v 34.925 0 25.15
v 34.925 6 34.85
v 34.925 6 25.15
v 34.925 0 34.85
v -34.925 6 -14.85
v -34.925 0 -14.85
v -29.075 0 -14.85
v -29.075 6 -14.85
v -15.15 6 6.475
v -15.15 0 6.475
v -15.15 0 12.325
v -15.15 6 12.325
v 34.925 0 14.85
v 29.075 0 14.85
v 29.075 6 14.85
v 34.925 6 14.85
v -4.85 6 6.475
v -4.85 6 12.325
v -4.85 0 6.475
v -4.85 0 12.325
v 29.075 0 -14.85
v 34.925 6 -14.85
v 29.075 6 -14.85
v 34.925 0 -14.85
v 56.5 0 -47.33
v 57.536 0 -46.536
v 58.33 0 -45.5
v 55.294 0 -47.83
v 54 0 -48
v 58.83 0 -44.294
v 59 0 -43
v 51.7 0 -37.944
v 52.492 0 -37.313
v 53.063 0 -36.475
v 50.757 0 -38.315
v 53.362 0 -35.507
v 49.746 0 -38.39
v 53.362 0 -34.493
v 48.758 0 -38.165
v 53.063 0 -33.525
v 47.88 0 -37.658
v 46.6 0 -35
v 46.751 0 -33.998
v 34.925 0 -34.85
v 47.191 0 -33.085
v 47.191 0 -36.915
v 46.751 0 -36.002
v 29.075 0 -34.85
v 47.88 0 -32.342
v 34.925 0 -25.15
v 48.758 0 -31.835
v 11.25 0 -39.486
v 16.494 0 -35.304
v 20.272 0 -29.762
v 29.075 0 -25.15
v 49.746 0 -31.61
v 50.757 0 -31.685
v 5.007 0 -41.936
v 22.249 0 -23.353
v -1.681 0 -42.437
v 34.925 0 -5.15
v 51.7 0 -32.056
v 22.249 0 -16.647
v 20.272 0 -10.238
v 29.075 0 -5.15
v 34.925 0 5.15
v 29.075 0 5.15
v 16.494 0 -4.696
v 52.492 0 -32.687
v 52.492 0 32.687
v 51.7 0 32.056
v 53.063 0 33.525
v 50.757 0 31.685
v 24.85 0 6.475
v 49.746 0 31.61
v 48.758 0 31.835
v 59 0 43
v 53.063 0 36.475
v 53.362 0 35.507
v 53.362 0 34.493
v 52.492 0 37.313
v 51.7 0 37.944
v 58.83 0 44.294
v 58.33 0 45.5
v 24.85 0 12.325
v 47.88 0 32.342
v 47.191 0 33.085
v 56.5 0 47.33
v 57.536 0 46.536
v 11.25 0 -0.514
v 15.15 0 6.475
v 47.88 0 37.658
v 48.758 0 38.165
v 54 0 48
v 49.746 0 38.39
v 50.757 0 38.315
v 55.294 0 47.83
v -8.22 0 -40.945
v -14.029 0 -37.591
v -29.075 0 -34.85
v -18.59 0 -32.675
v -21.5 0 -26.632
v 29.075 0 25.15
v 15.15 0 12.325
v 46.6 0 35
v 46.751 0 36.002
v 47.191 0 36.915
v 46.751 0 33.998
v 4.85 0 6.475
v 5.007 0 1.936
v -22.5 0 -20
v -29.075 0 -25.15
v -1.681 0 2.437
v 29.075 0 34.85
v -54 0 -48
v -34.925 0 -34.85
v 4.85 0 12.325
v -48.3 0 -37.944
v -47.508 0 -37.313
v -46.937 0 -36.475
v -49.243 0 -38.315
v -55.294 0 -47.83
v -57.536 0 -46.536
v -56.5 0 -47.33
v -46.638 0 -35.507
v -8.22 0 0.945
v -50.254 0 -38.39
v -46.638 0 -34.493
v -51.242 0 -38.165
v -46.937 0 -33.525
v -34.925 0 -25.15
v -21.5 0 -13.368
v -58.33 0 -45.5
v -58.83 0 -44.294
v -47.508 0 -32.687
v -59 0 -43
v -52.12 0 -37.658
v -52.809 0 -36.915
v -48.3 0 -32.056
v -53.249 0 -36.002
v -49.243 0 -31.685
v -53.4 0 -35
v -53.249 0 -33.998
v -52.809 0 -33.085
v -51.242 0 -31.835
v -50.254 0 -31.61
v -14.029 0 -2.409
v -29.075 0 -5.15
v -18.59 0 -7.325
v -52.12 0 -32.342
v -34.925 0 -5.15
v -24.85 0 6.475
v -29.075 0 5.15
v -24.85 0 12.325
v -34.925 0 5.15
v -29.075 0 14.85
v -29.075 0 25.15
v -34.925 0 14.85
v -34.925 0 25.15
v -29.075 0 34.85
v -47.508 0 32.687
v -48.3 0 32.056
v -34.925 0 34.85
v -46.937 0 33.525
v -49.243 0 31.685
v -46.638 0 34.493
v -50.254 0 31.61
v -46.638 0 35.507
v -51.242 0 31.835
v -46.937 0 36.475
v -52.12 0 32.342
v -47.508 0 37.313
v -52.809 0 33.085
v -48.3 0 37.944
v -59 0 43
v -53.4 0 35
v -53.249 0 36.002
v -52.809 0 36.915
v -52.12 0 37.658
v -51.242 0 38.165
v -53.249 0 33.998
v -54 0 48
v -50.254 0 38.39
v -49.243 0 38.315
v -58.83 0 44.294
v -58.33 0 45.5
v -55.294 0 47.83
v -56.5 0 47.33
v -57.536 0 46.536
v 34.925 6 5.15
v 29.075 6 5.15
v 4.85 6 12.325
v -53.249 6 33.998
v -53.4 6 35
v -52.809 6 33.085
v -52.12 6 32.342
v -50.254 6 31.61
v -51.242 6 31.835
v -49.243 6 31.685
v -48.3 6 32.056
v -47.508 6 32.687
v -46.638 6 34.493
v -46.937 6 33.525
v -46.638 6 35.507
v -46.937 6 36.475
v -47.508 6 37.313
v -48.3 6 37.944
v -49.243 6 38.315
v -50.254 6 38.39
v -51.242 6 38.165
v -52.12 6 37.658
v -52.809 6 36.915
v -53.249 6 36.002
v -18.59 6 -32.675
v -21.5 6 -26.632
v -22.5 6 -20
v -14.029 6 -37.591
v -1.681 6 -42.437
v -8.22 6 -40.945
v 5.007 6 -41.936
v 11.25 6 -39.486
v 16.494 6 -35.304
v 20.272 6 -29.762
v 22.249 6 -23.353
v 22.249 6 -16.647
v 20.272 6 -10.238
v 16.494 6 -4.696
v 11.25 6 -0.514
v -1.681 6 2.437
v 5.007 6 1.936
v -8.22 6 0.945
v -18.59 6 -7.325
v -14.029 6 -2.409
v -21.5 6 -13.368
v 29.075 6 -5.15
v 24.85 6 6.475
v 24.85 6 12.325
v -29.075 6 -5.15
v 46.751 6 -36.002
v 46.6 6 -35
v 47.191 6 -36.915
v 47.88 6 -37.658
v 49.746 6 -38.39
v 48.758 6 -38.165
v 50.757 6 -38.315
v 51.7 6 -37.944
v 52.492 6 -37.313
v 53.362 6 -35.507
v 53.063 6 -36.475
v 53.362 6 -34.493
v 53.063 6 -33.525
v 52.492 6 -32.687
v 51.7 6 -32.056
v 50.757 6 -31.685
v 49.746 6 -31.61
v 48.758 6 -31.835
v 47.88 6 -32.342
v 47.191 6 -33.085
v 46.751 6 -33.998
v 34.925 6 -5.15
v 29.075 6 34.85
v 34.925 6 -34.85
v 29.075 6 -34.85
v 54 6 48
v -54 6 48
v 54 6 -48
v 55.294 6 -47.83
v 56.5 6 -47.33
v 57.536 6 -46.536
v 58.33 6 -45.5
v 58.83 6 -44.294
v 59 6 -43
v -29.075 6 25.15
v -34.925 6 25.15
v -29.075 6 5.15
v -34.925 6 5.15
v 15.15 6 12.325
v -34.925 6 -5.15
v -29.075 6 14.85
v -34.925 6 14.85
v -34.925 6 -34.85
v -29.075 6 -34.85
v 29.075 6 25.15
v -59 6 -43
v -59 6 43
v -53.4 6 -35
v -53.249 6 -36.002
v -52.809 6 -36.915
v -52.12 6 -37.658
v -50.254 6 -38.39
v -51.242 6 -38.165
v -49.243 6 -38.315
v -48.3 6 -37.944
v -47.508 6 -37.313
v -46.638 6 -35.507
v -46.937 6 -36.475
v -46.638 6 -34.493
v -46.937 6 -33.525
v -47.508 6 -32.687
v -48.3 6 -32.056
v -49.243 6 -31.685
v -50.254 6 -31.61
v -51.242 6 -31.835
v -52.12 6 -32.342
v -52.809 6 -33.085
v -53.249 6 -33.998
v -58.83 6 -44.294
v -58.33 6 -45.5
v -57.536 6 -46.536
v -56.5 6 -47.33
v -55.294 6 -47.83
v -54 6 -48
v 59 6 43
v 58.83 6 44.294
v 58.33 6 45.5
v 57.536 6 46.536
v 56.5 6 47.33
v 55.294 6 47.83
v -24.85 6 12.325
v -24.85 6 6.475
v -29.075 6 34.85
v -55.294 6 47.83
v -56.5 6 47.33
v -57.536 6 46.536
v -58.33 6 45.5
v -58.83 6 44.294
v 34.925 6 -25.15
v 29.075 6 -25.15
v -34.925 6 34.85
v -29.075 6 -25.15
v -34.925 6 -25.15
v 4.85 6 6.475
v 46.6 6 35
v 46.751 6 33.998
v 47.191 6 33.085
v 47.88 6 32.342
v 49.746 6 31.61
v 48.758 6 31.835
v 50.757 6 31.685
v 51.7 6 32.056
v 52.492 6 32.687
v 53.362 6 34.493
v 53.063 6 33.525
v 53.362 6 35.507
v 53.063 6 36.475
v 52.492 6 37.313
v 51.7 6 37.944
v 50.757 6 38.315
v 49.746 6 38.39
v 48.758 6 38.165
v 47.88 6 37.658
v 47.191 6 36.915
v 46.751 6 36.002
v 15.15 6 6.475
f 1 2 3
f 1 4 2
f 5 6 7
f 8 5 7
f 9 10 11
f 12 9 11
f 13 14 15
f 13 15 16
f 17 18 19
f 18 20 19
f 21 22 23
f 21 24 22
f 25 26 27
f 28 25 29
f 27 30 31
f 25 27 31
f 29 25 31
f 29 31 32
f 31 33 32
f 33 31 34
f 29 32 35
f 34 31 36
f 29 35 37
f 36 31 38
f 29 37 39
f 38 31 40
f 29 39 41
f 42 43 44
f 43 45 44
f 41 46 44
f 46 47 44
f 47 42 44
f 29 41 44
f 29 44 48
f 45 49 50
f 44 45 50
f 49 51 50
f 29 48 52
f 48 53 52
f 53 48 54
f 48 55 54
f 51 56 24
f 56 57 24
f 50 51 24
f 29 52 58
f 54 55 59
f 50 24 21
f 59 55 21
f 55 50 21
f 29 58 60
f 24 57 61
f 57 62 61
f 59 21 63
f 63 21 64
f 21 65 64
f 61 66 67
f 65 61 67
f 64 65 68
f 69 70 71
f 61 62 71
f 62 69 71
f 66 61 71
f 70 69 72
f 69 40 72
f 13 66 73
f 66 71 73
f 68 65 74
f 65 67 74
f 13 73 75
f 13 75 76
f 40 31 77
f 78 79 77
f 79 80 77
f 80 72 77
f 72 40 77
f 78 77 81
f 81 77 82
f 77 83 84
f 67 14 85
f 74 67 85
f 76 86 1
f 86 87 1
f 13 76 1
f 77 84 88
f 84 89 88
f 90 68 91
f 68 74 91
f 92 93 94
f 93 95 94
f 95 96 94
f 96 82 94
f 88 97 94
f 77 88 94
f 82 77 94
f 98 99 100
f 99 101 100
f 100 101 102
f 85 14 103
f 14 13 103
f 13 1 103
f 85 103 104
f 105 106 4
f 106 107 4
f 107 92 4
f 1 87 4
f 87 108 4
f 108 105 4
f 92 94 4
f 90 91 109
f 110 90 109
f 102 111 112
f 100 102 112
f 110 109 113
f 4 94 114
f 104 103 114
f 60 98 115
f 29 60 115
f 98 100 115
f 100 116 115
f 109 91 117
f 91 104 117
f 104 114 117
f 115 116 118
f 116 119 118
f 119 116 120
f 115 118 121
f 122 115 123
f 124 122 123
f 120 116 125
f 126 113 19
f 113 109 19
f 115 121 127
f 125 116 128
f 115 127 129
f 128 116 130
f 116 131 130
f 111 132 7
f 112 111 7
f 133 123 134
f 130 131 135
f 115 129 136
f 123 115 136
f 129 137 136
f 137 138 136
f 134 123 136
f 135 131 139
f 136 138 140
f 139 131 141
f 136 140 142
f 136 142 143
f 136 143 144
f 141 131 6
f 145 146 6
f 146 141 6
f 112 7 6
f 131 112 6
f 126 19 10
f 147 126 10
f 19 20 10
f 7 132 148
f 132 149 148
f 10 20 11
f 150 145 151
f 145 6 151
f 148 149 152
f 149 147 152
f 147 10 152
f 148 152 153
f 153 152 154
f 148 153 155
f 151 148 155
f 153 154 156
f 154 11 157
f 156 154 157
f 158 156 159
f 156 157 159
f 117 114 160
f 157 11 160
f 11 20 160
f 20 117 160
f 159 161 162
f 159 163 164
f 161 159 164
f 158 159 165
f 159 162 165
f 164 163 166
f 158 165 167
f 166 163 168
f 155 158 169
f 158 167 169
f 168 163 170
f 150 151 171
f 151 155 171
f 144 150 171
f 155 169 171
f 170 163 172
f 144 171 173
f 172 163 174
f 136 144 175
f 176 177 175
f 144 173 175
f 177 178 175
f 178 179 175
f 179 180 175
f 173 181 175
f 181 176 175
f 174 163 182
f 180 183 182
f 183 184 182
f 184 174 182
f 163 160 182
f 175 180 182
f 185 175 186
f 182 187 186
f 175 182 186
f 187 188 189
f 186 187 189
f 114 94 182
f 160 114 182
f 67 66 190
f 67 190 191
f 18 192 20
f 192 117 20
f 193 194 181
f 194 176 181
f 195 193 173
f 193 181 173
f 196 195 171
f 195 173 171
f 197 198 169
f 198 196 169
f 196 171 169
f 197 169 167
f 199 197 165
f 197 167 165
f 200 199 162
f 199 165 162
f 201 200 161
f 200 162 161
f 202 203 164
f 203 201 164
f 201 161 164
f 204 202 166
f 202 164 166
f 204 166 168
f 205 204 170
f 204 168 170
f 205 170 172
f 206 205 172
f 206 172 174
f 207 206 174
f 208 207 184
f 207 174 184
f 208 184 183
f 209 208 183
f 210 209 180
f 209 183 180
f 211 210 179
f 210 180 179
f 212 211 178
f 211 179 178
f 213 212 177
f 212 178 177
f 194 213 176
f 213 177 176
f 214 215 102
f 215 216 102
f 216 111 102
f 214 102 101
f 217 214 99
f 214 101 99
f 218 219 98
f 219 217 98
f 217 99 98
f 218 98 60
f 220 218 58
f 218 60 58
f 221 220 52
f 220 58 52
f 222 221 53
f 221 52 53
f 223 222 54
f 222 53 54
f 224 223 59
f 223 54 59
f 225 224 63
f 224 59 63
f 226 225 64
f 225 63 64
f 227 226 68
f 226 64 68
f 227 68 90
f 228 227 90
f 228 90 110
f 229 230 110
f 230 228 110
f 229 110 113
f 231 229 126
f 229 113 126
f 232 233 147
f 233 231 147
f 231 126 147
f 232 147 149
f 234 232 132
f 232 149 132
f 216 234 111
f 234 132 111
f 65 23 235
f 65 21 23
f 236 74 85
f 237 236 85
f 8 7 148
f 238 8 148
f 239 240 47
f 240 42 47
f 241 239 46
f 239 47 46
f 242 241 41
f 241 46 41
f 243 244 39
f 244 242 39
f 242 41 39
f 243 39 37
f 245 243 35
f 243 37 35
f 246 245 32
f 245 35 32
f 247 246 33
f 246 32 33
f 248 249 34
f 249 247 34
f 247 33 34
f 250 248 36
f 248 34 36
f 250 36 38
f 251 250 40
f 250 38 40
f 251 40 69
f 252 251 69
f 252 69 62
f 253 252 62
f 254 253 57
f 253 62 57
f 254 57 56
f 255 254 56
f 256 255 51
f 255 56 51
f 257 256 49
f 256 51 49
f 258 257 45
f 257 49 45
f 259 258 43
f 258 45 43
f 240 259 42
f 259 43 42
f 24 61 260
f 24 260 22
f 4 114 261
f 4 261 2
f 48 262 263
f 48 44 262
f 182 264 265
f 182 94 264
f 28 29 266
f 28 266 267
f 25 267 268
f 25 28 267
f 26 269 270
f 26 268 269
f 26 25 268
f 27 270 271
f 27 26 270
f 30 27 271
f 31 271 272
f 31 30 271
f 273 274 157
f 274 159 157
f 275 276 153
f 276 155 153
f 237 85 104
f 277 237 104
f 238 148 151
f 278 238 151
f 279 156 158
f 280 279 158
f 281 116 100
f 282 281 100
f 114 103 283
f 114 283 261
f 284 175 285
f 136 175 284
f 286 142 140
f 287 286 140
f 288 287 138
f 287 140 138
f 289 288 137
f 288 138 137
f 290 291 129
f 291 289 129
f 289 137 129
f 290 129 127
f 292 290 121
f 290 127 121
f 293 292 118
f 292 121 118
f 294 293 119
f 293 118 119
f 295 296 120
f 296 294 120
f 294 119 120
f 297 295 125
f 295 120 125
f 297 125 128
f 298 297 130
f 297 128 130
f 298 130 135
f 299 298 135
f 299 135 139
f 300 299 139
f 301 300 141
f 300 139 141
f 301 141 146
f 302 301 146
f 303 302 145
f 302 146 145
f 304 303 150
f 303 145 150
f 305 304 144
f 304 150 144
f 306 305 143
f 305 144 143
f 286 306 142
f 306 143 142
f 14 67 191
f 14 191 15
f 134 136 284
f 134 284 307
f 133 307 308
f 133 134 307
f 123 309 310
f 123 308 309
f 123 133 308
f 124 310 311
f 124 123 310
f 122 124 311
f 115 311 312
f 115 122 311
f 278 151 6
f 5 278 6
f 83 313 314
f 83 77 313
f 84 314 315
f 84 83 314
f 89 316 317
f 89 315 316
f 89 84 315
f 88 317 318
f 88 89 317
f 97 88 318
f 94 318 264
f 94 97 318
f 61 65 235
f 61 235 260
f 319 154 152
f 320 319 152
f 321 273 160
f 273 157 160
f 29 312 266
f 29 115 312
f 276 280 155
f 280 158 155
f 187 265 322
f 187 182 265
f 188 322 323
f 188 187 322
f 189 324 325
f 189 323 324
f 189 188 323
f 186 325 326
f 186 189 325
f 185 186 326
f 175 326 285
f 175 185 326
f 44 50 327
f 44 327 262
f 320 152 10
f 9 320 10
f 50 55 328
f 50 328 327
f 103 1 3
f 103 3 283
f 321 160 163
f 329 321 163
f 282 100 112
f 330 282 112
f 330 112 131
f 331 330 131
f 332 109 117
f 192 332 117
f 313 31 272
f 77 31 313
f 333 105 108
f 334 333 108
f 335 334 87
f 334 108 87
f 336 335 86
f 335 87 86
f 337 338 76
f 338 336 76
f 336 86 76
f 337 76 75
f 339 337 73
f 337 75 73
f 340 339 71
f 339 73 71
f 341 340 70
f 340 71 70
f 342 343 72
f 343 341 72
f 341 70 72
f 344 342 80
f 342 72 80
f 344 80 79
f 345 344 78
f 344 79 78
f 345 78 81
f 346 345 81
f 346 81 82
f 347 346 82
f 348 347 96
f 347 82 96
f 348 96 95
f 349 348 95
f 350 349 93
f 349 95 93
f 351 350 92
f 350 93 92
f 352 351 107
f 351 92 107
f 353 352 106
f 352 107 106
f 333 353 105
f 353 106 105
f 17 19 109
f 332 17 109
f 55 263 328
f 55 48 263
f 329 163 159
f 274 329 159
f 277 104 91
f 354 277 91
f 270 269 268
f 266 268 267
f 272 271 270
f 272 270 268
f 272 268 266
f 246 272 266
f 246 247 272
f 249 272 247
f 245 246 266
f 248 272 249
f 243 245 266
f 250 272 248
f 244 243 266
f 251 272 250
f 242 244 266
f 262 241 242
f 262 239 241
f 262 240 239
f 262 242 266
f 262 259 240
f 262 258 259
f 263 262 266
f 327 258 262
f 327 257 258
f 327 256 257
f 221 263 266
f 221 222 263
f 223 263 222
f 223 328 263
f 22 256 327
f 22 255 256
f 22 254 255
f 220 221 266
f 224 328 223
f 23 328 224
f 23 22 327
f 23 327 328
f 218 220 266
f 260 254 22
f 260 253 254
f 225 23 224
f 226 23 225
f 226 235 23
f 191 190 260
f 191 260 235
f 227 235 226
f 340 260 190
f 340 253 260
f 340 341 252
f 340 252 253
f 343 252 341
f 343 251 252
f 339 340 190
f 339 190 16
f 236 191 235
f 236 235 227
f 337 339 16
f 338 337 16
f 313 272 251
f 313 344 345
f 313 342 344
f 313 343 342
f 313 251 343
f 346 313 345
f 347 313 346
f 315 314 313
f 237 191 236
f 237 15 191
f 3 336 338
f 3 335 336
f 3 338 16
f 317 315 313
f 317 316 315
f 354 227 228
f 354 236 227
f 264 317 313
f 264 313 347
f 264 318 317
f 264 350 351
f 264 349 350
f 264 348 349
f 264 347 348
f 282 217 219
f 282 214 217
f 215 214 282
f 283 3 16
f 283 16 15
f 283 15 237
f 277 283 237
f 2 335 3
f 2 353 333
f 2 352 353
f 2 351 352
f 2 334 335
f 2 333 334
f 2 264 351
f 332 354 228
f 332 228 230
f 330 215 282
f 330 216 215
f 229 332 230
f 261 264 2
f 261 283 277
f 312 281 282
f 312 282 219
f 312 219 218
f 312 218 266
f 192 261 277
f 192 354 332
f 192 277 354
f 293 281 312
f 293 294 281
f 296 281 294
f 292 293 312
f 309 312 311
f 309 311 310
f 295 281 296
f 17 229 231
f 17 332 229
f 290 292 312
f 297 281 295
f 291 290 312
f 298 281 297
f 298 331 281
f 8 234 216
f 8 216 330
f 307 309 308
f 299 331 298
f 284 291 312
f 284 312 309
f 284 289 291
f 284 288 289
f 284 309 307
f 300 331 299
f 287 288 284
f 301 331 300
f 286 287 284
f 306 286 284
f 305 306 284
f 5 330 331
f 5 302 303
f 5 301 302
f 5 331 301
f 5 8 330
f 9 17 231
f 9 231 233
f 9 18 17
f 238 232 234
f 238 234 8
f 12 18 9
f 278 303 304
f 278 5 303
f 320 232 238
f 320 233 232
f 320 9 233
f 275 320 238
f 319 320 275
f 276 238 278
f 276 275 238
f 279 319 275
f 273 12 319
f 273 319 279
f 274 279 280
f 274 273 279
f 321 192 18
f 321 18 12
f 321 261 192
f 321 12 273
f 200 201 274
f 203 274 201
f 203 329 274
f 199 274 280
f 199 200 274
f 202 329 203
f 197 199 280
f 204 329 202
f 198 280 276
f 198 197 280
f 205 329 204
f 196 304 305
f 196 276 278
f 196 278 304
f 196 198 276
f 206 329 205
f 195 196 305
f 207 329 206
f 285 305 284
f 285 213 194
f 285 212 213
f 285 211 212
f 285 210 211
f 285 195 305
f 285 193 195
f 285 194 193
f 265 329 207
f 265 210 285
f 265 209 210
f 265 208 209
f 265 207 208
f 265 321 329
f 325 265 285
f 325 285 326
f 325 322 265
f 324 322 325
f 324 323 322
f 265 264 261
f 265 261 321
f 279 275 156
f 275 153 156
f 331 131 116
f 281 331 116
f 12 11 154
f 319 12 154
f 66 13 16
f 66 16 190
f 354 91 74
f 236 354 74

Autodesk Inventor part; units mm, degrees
ref_plane "YZ Plane" through (0, 0, 0) normal (1, 0, 0) x (0, 1, 0)
ref_plane "XZ Plane" through (0, 0, 0) normal (0, 1, 0) x (-1, 0, 0)
ref_plane "XY Plane" through (0, 0, 0) normal (0, 0, 1) x (1, 0, 0)
sketch "Sketch1" plane through (0, 0, 0) normal (0, 1, 0) x (-1, 0, 0)
  line L0 (54, -48) -> (-54, -48)
  line L1 (-59, -43) -> (-59, 43)
  line L2 (-54, 48) -> (54, 48)
  line L3 (59, 43) -> (59, -43)
  line L4 (50, -35) -> (-50, -35) construction
  line L5 (-50, -35) -> (-50, 35) construction
  line L6 (-50, 35) -> (50, 35) construction
  line L7 (50, 35) -> (50, -35) construction
  arc A0 (59, 43) -> (54, 48) centre (54, 43) ccw
  arc A1 (-54, 48) -> (-59, 43) centre (-54, 43) ccw
  arc A2 (-59, -43) -> (-54, -48) centre (-54, -43) ccw
  arc A3 (54, -48) -> (59, -43) centre (54, -43) ccw
  circle A4 centre (50, -35) radius 3.4
  circle A5 centre (50, 35) radius 3.4
  circle A6 centre (-50, -35) radius 3.4
  circle A7 centre (-50, 35) radius 3.4
  line L8 (0, -20) -> (0, 20) construction
  line L9 (25, -20) -> (25, 20) construction
  line L10 (-25, 20) -> (-25, -20) construction
  arc A8 (-25, -20) -> (25, -20) centre (0, -20) ccw construction
  arc A9 (25, 20) -> (-25, 20) centre (0, 20) ccw construction
  circle A10 centre (0, -20) radius 22.5
  circle A11 centre (50, -35) radius 9.5 construction
  circle A12 centre (-50, -35) radius 9.5 construction
  circle A13 centre (50, 35) radius 9.5 construction
  circle A14 centre (-50, 35) radius 9.5 construction
  line L11 (35, -35) -> (29, -35) construction
  line L12 (29, -35) -> (29, 35) construction
  line L13 (29, 35) -> (35, 35) construction
  line L14 (35, 35) -> (35, -35) construction
  line L15 (35, 6.4) -> (-35, 6.4) construction
  line L16 (-35, 12.4) -> (35, 12.4) construction
  line L17 (35, 12.4) -> (35, 6.4) construction
  line L18 (-25, -20) -> (-25, 20) construction
  line L19 (4.85, 6.475) -> (-4.85, 6.475)
  line L20 (-4.85, 6.475) -> (-4.85, 12.325)
  line L21 (-4.85, 12.325) -> (4.85, 12.325)
  line L22 (4.85, 12.325) -> (4.85, 6.475)
  line L23 (0, 6.4) -> (0, 12.4) construction
  line L24 (34.925, -34.85) -> (29.075, -34.85)
  line L25 (29.075, -34.85) -> (29.075, -25.15)
  line L26 (29.075, -25.15) -> (34.925, -25.15)
  line L27 (34.925, -25.15) -> (34.925, -34.85)
  line L28 (34.925, -14.85) -> (29.075, -14.85)
  line L29 (34.925, -5.15) -> (34.925, -14.85)
  line L30 (29.075, -5.15) -> (34.925, -5.15)
  line L31 (29.075, -14.85) -> (29.075, -5.15)
  line L32 (34.925, 5.15) -> (29.075, 5.15)
  line L33 (34.925, 14.85) -> (34.925, 5.15)
  line L34 (29.075, 14.85) -> (34.925, 14.85)
  line L35 (29.075, 5.15) -> (29.075, 14.85)
  line L36 (34.925, 25.15) -> (29.075, 25.15)
  line L37 (34.925, 34.85) -> (34.925, 25.15)
  line L38 (29.075, 34.85) -> (34.925, 34.85)
  line L39 (29.075, 25.15) -> (29.075, 34.85)
  line L40 (-35, -35) -> (-29, -35) construction
  line L41 (-29, -35) -> (-29, 35) construction
  line L42 (-29, 35) -> (-35, 35) construction
  line L43 (-35, 35) -> (-35, -35) construction
  line L44 (-35, 12.4) -> (-35, 6.4) construction
  line L45 (-34.925, -34.85) -> (-29.075, -34.85)
  line L46 (-29.075, -34.85) -> (-29.075, -25.15)
  line L47 (-29.075, -25.15) -> (-34.925, -25.15)
  line L48 (-34.925, -25.15) -> (-34.925, -34.85)
  line L49 (-34.925, -14.85) -> (-29.075, -14.85)
  line L50 (-34.925, -5.15) -> (-34.925, -14.85)
  line L51 (-29.075, -5.15) -> (-34.925, -5.15)
  line L52 (-29.075, -14.85) -> (-29.075, -5.15)
  line L53 (-34.925, 5.15) -> (-29.075, 5.15)
  line L54 (-34.925, 14.85) -> (-34.925, 5.15)
  line L55 (-29.075, 14.85) -> (-34.925, 14.85)
  line L56 (-29.075, 5.15) -> (-29.075, 14.85)
  line L57 (-34.925, 25.15) -> (-29.075, 25.15)
  line L58 (-34.925, 34.85) -> (-34.925, 25.15)
  line L59 (-29.075, 34.85) -> (-34.925, 34.85)
  line L60 (-29.075, 25.15) -> (-29.075, 34.85)
  line L61 (24.85, 6.475) -> (15.15, 6.475)
  line L62 (24.85, 12.325) -> (24.85, 6.475)
  line L63 (20, 6.4) -> (20, 12.4) construction
  line L64 (15.15, 12.325) -> (24.85, 12.325)
  line L65 (15.15, 6.475) -> (15.15, 12.325)
  line L66 (-15.15, 6.475) -> (-24.85, 6.475)
  line L67 (-15.15, 12.325) -> (-15.15, 6.475)
  line L68 (-20, 6.4) -> (-20, 12.4) construction
  line L69 (-24.85, 12.325) -> (-15.15, 12.325)
  line L70 (-24.85, 6.475) -> (-24.85, 12.325)
  line L71 (4.85, 6.475) -> (-4.85, 6.475)
  line L72 (4.85, 12.325) -> (4.85, 6.475)
  line L73 (0, 6.4) -> (0, 12.4) construction
  line L74 (-4.85, 12.325) -> (4.85, 12.325)
  line L75 (-4.85, 6.475) -> (-4.85, 12.325)
  point P0 (0, 0)
  point P1 (-59, 0)
  point P2 (0, -48)
  point P3 (0, -35)
  point P4 (-50, 0)
  point P5 (0, 0)
  point P6 (32, -35)
  point P7 (-4.85, 9.4)
  point P8 (4.85, 9.4)
  point P9 (0, 6.475)
  point P10 (32, -25.15)
  point P11 (32, -30)
  point P12 (29.075, -30)
  point P13 (32, -34.85)
  point P14 (32, -35)
  point P15 (29, 0)
  point P16 (32, -14.85)
  point P17 (32, -5.15)
  point P18 (29.075, -10)
  point P19 (32, -10)
  point P20 (32, 5.15)
  point P21 (32, 14.85)
  point P22 (29.075, 10)
  point P23 (32, 10)
  point P24 (32, 25.15)
  point P25 (32, 34.85)
  point P26 (29.075, 30)
  point P27 (32, 30)
  point P28 (-32, -35)
  point P29 (-32, -25.15)
  point P30 (-32, -30)
  point P31 (-29.075, -30)
  point P32 (-32, -34.85)
  point P33 (-32, -35)
  point P34 (-29, 0)
  point P35 (-32, -14.85)
  point P36 (-32, -5.15)
  point P37 (-29.075, -10)
  point P38 (-32, -10)
  point P39 (-32, 5.15)
  point P40 (-32, 14.85)
  point P41 (-29.075, 10)
  point P42 (-32, 10)
  point P43 (-32, 25.15)
  point P44 (-32, 34.85)
  point P45 (-29.075, 30)
  point P46 (-32, 30)
  point P47 (35, 9.4)
  point P48 (35, 0)
  point P49 (20, 6.475)
  point P50 (24.85, 9.4)
  point P51 (15.15, 9.4)
  point P52 (-20, 6.475)
  point P53 (-15.15, 9.4)
  point P54 (-24.85, 9.4)
  point P55 (0, 6.475)
  point P56 (4.85, 9.4)
  point P57 (-4.85, 9.4)
  dimension "d0" = 96
  dimension "d1" = 118
  dimension "d2" = 70
  dimension "d3" = 100
  dimension "d4" = 5
  dimension "d5" = 6.8
  dimension "d6" = 6.8
  dimension "d8" = 6.8
  dimension "d10" = 6.8
  dimension "d13" = 25
  dimension "d14" = 40
  dimension "d17" = 45
  dimension "d19" = 19
  dimension "d22" = 100
  dimension "d25" = 70
  dimension "d28" = 6
  dimension "d29" = 6
  dimension "d30" = 26.4
  dimension "d31" = 15
  dimension "d41" = 5.85
  dimension "d42" = 9.7
  dimension "d54" = 5.85
  dimension "d55" = 9.7
  dimension "d56" = 30
  dimension "d59" = 20
  dimension "d64" = 9.4
  dimension "d67" = 20
  dimension "d70" = 20
extrude "Extrusion1" add sketch "Sketch1" along normal blind 6
equation "\"d0\" = moduleHeight"
equation "\"d1\" = moduleWidth"
equation "\"d2\" = moduleMountH"
equation "\"d3\" = moduleMountW"
equation "\"d4\" = moduleCornerR"
equation "\"d5\" = moduleMountD"
equation "\"d6\" = moduleMountD"
equation "\"d8\" = moduleMountD"
equation "\"d10\" = moduleMountD"
equation "\"d13\" = moduleOpeningR"
equation "\"d14\" = moduleOpeningH"
equation "\"d17\" = openingMFC"
equation "\"d19\" = moduleMountClearance"
equation "\"d28\" = thickness"
equation "\"d29\" = thickness"
equation "\"d30\" = 0.5 * actuatorH + thickness"
equation "\"d31\" = supportSpacingFromMounting"
equation "\"d41\" = fingerholeH"
equation "\"d42\" = fingerholeW"
equation "\"d54\" = fingerholeH"
equation "\"d55\" = fingerholeW"
equation "\"d56\" = 1.5 * fingerSpacing"
equation "\"d15\" = thickness"
equation "\"moduleWidth\" = 118"
equation "\"moduleHeight\" = 96"
equation "\"moduleMountW\" = 100"
equation "\"moduleMountH\" = 70"
equation "\"moduleMountD\" = 6.8"
equation "\"moduleCornerR\" = 5"
equation "\"moduleOpeningR\" = 25"
equation "\"moduleOpeningH\" = 40"
equation "\"thickness\" = 6"
equation "\"kerf\" = 0.15"
equation "\"fingerholeW\" = fingerW - 2 * kerf"
equation "\"fingerholeH\" = thickness - kerf"
equation "\"moduleMountClearance\" = 19"
equation "\"actuatorW\" = 28"
equation "\"actuatorH\" = 40.8"
equation "\"openingMFC\" = 45"
equation "\"supportXW\" = -2 * thickness + moduleMountW - 2 * supportSpacingFromMounting + kerf"
equation "\"supportSpacingFromMounting\" = 15"
equation "\"supportsCTCZ\" = 9.4"
equation "\"fingerW\" = 10"
equation "\"fingerSpacing\" = 20"
properties part number "Module_base_MFC"
